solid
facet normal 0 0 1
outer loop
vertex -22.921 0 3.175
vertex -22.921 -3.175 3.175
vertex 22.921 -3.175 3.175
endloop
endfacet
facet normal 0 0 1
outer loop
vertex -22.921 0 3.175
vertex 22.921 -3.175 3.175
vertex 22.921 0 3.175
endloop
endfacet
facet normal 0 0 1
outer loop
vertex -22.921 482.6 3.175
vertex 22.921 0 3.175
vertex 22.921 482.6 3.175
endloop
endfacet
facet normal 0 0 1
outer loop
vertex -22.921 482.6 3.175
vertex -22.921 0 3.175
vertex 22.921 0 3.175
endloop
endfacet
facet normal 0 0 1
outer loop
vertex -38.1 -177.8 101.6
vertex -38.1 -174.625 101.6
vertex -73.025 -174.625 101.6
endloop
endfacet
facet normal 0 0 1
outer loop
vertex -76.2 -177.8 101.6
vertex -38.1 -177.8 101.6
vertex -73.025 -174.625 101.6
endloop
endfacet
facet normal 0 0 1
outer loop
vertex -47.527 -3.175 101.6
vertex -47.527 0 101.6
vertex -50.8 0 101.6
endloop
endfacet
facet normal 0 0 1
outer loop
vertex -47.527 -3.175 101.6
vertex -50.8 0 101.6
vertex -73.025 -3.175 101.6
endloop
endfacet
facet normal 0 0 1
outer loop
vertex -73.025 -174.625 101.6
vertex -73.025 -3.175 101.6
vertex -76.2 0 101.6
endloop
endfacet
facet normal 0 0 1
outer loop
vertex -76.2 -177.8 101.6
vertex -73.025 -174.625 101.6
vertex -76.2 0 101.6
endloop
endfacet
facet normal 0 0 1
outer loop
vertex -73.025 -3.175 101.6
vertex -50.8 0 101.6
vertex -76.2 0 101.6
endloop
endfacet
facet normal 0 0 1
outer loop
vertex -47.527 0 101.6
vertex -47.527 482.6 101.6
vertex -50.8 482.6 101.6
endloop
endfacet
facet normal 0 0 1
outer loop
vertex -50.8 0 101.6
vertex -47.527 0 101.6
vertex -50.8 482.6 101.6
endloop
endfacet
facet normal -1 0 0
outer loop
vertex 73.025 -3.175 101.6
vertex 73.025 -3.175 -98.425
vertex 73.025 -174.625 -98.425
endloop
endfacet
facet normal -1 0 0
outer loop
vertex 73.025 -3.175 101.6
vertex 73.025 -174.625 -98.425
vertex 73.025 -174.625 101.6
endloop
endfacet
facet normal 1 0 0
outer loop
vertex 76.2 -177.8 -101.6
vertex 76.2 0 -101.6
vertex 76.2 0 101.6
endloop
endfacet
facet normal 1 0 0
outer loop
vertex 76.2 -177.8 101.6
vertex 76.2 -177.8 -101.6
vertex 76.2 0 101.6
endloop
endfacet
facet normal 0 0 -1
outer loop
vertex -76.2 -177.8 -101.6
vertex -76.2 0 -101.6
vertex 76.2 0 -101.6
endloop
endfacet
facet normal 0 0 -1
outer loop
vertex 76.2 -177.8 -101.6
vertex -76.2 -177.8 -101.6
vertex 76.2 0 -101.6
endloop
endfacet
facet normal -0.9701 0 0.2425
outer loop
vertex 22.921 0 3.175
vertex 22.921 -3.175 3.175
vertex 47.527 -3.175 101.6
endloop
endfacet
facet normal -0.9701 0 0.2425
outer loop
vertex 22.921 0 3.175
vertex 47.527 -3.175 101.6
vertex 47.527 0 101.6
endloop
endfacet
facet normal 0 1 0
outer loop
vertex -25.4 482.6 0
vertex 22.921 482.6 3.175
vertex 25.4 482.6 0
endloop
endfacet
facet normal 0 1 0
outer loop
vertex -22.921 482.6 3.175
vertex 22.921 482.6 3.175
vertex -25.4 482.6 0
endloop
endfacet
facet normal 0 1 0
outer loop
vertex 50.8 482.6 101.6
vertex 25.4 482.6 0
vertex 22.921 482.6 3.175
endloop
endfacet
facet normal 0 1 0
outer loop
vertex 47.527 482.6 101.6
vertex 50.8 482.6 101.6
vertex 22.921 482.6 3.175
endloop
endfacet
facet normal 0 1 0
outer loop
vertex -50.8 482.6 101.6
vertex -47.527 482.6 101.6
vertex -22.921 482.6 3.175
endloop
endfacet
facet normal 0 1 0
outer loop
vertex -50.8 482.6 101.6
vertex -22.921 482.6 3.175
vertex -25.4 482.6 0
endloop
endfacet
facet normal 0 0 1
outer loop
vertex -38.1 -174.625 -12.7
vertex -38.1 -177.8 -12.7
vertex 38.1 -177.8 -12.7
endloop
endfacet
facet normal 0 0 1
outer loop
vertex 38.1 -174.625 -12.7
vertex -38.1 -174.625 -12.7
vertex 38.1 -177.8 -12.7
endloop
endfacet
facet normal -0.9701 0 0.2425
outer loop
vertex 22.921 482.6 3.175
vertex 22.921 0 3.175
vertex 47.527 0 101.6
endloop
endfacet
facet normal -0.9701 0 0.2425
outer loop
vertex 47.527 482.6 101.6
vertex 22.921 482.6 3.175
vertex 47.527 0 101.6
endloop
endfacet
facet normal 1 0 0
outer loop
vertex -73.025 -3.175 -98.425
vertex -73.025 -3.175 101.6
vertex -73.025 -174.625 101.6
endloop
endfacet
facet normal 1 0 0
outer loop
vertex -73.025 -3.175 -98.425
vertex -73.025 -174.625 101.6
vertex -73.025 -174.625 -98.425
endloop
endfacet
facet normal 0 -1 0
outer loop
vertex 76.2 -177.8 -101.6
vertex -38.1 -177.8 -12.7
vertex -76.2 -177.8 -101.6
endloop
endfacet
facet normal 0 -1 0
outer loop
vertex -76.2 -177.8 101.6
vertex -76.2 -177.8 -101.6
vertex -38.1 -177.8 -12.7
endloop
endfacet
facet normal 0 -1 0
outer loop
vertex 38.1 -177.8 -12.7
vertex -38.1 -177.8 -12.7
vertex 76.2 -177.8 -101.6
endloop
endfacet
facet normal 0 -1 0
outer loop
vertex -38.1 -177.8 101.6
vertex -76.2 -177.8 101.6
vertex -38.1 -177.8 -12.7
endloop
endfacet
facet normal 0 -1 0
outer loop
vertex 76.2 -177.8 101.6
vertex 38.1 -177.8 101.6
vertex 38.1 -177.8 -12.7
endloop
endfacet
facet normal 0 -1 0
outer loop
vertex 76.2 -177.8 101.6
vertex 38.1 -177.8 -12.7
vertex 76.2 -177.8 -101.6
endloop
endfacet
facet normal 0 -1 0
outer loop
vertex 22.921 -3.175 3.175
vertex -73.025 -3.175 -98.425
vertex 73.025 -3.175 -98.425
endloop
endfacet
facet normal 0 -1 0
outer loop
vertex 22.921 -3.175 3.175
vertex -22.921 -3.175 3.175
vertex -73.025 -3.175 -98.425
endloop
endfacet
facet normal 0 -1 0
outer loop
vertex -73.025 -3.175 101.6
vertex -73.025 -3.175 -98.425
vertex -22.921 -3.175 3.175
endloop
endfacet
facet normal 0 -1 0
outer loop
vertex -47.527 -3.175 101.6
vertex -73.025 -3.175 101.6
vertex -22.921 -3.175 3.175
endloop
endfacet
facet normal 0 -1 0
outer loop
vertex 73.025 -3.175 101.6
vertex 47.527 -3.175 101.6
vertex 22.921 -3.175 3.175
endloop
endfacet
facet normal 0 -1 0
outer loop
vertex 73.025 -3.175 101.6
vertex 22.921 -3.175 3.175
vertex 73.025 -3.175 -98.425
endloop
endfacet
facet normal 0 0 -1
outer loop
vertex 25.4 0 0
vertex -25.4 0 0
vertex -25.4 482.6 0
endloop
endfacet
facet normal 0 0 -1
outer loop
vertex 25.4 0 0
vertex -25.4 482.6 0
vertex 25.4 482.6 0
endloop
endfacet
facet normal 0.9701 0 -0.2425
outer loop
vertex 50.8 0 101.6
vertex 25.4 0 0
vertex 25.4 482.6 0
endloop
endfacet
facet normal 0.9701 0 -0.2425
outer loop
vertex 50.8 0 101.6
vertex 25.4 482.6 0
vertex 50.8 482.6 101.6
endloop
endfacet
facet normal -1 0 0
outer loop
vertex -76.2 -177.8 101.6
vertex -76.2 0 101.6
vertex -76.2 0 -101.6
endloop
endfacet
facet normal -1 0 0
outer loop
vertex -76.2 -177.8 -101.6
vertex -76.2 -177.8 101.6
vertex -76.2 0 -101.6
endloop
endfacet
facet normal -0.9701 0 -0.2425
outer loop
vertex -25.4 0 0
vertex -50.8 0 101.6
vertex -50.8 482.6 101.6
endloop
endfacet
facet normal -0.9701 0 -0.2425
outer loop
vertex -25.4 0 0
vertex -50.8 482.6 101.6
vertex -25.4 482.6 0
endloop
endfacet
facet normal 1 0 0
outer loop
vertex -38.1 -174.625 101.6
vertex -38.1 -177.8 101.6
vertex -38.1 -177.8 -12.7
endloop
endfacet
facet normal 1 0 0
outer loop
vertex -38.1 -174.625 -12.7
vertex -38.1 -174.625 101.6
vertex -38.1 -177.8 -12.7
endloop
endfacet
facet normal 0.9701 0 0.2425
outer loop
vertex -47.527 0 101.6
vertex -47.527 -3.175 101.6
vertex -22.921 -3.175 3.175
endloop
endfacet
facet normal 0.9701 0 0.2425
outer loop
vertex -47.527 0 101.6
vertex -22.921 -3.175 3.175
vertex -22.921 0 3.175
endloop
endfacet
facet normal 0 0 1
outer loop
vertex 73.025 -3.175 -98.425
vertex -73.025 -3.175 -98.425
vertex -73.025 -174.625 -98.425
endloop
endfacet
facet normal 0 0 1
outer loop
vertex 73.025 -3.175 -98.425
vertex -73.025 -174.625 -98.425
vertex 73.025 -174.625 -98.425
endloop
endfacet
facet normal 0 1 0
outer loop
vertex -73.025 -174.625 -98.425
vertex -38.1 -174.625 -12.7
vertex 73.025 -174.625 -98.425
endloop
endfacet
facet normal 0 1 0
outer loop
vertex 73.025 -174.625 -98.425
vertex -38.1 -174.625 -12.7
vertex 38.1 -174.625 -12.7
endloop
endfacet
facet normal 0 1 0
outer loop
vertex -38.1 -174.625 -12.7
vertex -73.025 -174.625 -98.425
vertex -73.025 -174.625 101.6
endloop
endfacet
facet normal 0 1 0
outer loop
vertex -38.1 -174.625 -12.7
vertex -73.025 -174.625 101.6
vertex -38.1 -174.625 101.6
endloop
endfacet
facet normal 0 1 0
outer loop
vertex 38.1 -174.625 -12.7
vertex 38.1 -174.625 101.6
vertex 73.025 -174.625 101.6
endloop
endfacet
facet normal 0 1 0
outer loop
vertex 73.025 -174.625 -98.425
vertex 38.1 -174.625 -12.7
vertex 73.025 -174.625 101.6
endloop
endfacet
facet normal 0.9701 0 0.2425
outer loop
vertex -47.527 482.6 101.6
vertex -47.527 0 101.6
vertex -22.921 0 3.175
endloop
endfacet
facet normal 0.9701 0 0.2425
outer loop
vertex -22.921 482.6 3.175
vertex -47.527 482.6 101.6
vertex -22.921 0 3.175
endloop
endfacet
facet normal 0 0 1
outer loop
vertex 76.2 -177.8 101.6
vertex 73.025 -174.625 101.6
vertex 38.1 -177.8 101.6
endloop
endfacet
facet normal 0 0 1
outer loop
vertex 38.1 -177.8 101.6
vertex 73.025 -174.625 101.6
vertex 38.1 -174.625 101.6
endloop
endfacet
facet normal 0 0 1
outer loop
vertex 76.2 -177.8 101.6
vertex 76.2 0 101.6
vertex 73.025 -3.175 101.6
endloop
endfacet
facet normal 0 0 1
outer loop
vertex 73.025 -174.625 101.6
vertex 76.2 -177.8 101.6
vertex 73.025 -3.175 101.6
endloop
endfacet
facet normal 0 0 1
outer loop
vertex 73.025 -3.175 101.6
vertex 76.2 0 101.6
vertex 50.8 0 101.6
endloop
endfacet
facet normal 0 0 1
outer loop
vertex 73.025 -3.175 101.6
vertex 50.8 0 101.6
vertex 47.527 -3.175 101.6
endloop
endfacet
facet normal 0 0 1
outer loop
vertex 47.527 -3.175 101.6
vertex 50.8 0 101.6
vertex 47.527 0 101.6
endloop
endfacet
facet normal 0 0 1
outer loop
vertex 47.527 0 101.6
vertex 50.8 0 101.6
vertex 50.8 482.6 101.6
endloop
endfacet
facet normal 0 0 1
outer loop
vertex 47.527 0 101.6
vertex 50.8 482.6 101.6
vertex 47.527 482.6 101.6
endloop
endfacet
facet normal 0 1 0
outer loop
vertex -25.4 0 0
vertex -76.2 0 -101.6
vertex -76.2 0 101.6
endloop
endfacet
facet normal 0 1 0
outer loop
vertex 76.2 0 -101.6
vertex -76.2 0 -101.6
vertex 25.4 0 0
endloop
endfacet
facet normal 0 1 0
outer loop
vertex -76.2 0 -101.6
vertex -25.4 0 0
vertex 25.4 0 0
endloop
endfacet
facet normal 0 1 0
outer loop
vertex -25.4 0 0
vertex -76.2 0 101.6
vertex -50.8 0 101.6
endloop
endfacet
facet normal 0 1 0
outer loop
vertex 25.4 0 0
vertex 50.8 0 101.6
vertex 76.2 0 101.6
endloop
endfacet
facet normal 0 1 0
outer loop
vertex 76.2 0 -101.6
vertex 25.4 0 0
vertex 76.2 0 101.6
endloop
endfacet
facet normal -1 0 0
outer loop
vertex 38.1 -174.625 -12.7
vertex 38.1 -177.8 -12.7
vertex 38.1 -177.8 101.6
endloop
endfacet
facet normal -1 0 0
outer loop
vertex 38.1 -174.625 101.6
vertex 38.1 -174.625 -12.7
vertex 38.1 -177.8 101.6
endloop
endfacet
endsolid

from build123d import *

# Parameters (mm, degrees)
F1_DEPTH    = 508
F3_DEPTH    = 177.8
F4_T        = 3.175
F4_T3_DEPTH = 111.0768828907
F4_T5_DEPTH = 57.15
F4_T7_DEPTH = 111.0768828907
F6_DEPTH    = 25.4
F8_DEPTH    = 25.4


# Not quite as in the source:
# - a shell that OpenCascade refuses in one call is made with other operations: the cavity is built on its own and cut out


with BuildPart() as f1:
    # F0 (on Front) → F1 (new body)
    with BuildSketch(Plane.XZ):
        Polygon((-25.4, 0), (0, 0), (25.4, 0), (50.8, 101.6), (-50.8, 101.6), align=None)
    extrude(amount=-F1_DEPTH)

    # F2 (on Front) → F3 (join)
    with BuildSketch(Plane.XZ):
        Polygon((76.2, -101.6), (76.2, 0), (76.2, 101.6), (-76.2, 101.6), (-76.2, 0), (-76.2, -101.6), align=None)
    extrude(amount=F3_DEPTH)

    # F4: shell of thickness 3.175, made by hand


with BuildPart() as f4_core1:
    # F4_t2: copy of F1
    add(f1.part)

    # the walls: a layer under each face that stays
    f4_faces = [f4_core1.faces().sort_by_distance(p)[0] for p in [
        (76.2, -88.9, 0),
        (0, -88.9, -101.6),
        (0, -177.8, 0),
        (-50.8, 0, -67.7333333333),
        (-76.2, -88.9, 0),
        (-38.1, 254, 50.8),
        (0, 254, 0),
        (38.1, 254, 50.8),
        (0, 508, 50.8),
    ]]
    thicken(f4_faces, amount=-F4_T, mode=Mode.SUBTRACT)

    # F4_s4 → F4_t3 (cut)
    with BuildSketch(Plane(origin=(-27.6641682565, 0, 110.6566730262), x_dir=(0, 1, 0), z_dir=(0.242535625, 0, -0.9701425001))):
        Polygon((0.03175, -24.6733695037), (-3.175, -24.6416195037), (-3.175, -21.4666195037), (0, -21.4666195037), align=None)
    extrude(amount=F4_T3_DEPTH, mode=Mode.SUBTRACT)

    # F4_s6 → F4_t5 (cut)
    with BuildSketch(Plane.YZ.offset(-28.575)):
        Polygon((0.03175, -0.03175), (-3.175, 0), (-3.175, 3.175), (0, 3.175), align=None)
    extrude(amount=F4_T5_DEPTH, mode=Mode.SUBTRACT)

    # F4_s8 → F4_t7 (cut)
    with BuildSketch(Plane(origin=(0.7240670376, 0, 2.8962681503), x_dir=(0, 1, 0), z_dir=(0.242535625, 0, 0.9701425001))):
        Polygon((0.03175, -24.6733695037), (-3.175, -24.6416195037), (-3.175, -21.4666195037), (0, -21.4666195037), align=None)
    extrude(amount=F4_T7_DEPTH, mode=Mode.SUBTRACT)


with BuildPart() as f1_1:
    add(f1.part)

    # what is left inside the walls is the cavity
    f4_cavity = [f4_core1.part.solids().sort_by_distance(p)[0] for p in [
        (0, 51.858333, 101.56825),
    ]]
    add(f4_cavity, mode=Mode.SUBTRACT)

    # F5 (on face) → F6 (cut)
    with BuildSketch(Plane(origin=(0, 508, 0), x_dir=(-1, 0, 0), z_dir=(0, 1, 0))):
        Polygon((-47.5272849097, 101.6), (-50.8, 101.6), (-50.00625, 98.425), (-25.4, 0), (25.4, 0), (50.00625, 98.425), (50.8, 101.6), (47.5272849097, 101.6), (46.7335349097, 98.425), (22.9210349097, 3.175), (-22.9210349097, 3.175), (-46.7335349097, 98.425), align=None)
        Polygon((47.5272849097, 101.6), (-47.5272849097, 101.6), (-46.7335349097, 98.425), (-22.9210349097, 3.175), (22.9210349097, 3.175), (46.7335349097, 98.425), align=None)
    extrude(amount=-F6_DEPTH, mode=Mode.SUBTRACT)

    # F7 (on face) → F8 (cut)
    with BuildSketch(Plane.XZ.offset(177.8)):
        Polygon((-38.1, -12.7), (0, -12.7), (38.1, -12.7), (38.1, 101.6), (-38.1, 101.6), align=None)
    extrude(amount=-F8_DEPTH, mode=Mode.SUBTRACT)


solid = f1_1.part
